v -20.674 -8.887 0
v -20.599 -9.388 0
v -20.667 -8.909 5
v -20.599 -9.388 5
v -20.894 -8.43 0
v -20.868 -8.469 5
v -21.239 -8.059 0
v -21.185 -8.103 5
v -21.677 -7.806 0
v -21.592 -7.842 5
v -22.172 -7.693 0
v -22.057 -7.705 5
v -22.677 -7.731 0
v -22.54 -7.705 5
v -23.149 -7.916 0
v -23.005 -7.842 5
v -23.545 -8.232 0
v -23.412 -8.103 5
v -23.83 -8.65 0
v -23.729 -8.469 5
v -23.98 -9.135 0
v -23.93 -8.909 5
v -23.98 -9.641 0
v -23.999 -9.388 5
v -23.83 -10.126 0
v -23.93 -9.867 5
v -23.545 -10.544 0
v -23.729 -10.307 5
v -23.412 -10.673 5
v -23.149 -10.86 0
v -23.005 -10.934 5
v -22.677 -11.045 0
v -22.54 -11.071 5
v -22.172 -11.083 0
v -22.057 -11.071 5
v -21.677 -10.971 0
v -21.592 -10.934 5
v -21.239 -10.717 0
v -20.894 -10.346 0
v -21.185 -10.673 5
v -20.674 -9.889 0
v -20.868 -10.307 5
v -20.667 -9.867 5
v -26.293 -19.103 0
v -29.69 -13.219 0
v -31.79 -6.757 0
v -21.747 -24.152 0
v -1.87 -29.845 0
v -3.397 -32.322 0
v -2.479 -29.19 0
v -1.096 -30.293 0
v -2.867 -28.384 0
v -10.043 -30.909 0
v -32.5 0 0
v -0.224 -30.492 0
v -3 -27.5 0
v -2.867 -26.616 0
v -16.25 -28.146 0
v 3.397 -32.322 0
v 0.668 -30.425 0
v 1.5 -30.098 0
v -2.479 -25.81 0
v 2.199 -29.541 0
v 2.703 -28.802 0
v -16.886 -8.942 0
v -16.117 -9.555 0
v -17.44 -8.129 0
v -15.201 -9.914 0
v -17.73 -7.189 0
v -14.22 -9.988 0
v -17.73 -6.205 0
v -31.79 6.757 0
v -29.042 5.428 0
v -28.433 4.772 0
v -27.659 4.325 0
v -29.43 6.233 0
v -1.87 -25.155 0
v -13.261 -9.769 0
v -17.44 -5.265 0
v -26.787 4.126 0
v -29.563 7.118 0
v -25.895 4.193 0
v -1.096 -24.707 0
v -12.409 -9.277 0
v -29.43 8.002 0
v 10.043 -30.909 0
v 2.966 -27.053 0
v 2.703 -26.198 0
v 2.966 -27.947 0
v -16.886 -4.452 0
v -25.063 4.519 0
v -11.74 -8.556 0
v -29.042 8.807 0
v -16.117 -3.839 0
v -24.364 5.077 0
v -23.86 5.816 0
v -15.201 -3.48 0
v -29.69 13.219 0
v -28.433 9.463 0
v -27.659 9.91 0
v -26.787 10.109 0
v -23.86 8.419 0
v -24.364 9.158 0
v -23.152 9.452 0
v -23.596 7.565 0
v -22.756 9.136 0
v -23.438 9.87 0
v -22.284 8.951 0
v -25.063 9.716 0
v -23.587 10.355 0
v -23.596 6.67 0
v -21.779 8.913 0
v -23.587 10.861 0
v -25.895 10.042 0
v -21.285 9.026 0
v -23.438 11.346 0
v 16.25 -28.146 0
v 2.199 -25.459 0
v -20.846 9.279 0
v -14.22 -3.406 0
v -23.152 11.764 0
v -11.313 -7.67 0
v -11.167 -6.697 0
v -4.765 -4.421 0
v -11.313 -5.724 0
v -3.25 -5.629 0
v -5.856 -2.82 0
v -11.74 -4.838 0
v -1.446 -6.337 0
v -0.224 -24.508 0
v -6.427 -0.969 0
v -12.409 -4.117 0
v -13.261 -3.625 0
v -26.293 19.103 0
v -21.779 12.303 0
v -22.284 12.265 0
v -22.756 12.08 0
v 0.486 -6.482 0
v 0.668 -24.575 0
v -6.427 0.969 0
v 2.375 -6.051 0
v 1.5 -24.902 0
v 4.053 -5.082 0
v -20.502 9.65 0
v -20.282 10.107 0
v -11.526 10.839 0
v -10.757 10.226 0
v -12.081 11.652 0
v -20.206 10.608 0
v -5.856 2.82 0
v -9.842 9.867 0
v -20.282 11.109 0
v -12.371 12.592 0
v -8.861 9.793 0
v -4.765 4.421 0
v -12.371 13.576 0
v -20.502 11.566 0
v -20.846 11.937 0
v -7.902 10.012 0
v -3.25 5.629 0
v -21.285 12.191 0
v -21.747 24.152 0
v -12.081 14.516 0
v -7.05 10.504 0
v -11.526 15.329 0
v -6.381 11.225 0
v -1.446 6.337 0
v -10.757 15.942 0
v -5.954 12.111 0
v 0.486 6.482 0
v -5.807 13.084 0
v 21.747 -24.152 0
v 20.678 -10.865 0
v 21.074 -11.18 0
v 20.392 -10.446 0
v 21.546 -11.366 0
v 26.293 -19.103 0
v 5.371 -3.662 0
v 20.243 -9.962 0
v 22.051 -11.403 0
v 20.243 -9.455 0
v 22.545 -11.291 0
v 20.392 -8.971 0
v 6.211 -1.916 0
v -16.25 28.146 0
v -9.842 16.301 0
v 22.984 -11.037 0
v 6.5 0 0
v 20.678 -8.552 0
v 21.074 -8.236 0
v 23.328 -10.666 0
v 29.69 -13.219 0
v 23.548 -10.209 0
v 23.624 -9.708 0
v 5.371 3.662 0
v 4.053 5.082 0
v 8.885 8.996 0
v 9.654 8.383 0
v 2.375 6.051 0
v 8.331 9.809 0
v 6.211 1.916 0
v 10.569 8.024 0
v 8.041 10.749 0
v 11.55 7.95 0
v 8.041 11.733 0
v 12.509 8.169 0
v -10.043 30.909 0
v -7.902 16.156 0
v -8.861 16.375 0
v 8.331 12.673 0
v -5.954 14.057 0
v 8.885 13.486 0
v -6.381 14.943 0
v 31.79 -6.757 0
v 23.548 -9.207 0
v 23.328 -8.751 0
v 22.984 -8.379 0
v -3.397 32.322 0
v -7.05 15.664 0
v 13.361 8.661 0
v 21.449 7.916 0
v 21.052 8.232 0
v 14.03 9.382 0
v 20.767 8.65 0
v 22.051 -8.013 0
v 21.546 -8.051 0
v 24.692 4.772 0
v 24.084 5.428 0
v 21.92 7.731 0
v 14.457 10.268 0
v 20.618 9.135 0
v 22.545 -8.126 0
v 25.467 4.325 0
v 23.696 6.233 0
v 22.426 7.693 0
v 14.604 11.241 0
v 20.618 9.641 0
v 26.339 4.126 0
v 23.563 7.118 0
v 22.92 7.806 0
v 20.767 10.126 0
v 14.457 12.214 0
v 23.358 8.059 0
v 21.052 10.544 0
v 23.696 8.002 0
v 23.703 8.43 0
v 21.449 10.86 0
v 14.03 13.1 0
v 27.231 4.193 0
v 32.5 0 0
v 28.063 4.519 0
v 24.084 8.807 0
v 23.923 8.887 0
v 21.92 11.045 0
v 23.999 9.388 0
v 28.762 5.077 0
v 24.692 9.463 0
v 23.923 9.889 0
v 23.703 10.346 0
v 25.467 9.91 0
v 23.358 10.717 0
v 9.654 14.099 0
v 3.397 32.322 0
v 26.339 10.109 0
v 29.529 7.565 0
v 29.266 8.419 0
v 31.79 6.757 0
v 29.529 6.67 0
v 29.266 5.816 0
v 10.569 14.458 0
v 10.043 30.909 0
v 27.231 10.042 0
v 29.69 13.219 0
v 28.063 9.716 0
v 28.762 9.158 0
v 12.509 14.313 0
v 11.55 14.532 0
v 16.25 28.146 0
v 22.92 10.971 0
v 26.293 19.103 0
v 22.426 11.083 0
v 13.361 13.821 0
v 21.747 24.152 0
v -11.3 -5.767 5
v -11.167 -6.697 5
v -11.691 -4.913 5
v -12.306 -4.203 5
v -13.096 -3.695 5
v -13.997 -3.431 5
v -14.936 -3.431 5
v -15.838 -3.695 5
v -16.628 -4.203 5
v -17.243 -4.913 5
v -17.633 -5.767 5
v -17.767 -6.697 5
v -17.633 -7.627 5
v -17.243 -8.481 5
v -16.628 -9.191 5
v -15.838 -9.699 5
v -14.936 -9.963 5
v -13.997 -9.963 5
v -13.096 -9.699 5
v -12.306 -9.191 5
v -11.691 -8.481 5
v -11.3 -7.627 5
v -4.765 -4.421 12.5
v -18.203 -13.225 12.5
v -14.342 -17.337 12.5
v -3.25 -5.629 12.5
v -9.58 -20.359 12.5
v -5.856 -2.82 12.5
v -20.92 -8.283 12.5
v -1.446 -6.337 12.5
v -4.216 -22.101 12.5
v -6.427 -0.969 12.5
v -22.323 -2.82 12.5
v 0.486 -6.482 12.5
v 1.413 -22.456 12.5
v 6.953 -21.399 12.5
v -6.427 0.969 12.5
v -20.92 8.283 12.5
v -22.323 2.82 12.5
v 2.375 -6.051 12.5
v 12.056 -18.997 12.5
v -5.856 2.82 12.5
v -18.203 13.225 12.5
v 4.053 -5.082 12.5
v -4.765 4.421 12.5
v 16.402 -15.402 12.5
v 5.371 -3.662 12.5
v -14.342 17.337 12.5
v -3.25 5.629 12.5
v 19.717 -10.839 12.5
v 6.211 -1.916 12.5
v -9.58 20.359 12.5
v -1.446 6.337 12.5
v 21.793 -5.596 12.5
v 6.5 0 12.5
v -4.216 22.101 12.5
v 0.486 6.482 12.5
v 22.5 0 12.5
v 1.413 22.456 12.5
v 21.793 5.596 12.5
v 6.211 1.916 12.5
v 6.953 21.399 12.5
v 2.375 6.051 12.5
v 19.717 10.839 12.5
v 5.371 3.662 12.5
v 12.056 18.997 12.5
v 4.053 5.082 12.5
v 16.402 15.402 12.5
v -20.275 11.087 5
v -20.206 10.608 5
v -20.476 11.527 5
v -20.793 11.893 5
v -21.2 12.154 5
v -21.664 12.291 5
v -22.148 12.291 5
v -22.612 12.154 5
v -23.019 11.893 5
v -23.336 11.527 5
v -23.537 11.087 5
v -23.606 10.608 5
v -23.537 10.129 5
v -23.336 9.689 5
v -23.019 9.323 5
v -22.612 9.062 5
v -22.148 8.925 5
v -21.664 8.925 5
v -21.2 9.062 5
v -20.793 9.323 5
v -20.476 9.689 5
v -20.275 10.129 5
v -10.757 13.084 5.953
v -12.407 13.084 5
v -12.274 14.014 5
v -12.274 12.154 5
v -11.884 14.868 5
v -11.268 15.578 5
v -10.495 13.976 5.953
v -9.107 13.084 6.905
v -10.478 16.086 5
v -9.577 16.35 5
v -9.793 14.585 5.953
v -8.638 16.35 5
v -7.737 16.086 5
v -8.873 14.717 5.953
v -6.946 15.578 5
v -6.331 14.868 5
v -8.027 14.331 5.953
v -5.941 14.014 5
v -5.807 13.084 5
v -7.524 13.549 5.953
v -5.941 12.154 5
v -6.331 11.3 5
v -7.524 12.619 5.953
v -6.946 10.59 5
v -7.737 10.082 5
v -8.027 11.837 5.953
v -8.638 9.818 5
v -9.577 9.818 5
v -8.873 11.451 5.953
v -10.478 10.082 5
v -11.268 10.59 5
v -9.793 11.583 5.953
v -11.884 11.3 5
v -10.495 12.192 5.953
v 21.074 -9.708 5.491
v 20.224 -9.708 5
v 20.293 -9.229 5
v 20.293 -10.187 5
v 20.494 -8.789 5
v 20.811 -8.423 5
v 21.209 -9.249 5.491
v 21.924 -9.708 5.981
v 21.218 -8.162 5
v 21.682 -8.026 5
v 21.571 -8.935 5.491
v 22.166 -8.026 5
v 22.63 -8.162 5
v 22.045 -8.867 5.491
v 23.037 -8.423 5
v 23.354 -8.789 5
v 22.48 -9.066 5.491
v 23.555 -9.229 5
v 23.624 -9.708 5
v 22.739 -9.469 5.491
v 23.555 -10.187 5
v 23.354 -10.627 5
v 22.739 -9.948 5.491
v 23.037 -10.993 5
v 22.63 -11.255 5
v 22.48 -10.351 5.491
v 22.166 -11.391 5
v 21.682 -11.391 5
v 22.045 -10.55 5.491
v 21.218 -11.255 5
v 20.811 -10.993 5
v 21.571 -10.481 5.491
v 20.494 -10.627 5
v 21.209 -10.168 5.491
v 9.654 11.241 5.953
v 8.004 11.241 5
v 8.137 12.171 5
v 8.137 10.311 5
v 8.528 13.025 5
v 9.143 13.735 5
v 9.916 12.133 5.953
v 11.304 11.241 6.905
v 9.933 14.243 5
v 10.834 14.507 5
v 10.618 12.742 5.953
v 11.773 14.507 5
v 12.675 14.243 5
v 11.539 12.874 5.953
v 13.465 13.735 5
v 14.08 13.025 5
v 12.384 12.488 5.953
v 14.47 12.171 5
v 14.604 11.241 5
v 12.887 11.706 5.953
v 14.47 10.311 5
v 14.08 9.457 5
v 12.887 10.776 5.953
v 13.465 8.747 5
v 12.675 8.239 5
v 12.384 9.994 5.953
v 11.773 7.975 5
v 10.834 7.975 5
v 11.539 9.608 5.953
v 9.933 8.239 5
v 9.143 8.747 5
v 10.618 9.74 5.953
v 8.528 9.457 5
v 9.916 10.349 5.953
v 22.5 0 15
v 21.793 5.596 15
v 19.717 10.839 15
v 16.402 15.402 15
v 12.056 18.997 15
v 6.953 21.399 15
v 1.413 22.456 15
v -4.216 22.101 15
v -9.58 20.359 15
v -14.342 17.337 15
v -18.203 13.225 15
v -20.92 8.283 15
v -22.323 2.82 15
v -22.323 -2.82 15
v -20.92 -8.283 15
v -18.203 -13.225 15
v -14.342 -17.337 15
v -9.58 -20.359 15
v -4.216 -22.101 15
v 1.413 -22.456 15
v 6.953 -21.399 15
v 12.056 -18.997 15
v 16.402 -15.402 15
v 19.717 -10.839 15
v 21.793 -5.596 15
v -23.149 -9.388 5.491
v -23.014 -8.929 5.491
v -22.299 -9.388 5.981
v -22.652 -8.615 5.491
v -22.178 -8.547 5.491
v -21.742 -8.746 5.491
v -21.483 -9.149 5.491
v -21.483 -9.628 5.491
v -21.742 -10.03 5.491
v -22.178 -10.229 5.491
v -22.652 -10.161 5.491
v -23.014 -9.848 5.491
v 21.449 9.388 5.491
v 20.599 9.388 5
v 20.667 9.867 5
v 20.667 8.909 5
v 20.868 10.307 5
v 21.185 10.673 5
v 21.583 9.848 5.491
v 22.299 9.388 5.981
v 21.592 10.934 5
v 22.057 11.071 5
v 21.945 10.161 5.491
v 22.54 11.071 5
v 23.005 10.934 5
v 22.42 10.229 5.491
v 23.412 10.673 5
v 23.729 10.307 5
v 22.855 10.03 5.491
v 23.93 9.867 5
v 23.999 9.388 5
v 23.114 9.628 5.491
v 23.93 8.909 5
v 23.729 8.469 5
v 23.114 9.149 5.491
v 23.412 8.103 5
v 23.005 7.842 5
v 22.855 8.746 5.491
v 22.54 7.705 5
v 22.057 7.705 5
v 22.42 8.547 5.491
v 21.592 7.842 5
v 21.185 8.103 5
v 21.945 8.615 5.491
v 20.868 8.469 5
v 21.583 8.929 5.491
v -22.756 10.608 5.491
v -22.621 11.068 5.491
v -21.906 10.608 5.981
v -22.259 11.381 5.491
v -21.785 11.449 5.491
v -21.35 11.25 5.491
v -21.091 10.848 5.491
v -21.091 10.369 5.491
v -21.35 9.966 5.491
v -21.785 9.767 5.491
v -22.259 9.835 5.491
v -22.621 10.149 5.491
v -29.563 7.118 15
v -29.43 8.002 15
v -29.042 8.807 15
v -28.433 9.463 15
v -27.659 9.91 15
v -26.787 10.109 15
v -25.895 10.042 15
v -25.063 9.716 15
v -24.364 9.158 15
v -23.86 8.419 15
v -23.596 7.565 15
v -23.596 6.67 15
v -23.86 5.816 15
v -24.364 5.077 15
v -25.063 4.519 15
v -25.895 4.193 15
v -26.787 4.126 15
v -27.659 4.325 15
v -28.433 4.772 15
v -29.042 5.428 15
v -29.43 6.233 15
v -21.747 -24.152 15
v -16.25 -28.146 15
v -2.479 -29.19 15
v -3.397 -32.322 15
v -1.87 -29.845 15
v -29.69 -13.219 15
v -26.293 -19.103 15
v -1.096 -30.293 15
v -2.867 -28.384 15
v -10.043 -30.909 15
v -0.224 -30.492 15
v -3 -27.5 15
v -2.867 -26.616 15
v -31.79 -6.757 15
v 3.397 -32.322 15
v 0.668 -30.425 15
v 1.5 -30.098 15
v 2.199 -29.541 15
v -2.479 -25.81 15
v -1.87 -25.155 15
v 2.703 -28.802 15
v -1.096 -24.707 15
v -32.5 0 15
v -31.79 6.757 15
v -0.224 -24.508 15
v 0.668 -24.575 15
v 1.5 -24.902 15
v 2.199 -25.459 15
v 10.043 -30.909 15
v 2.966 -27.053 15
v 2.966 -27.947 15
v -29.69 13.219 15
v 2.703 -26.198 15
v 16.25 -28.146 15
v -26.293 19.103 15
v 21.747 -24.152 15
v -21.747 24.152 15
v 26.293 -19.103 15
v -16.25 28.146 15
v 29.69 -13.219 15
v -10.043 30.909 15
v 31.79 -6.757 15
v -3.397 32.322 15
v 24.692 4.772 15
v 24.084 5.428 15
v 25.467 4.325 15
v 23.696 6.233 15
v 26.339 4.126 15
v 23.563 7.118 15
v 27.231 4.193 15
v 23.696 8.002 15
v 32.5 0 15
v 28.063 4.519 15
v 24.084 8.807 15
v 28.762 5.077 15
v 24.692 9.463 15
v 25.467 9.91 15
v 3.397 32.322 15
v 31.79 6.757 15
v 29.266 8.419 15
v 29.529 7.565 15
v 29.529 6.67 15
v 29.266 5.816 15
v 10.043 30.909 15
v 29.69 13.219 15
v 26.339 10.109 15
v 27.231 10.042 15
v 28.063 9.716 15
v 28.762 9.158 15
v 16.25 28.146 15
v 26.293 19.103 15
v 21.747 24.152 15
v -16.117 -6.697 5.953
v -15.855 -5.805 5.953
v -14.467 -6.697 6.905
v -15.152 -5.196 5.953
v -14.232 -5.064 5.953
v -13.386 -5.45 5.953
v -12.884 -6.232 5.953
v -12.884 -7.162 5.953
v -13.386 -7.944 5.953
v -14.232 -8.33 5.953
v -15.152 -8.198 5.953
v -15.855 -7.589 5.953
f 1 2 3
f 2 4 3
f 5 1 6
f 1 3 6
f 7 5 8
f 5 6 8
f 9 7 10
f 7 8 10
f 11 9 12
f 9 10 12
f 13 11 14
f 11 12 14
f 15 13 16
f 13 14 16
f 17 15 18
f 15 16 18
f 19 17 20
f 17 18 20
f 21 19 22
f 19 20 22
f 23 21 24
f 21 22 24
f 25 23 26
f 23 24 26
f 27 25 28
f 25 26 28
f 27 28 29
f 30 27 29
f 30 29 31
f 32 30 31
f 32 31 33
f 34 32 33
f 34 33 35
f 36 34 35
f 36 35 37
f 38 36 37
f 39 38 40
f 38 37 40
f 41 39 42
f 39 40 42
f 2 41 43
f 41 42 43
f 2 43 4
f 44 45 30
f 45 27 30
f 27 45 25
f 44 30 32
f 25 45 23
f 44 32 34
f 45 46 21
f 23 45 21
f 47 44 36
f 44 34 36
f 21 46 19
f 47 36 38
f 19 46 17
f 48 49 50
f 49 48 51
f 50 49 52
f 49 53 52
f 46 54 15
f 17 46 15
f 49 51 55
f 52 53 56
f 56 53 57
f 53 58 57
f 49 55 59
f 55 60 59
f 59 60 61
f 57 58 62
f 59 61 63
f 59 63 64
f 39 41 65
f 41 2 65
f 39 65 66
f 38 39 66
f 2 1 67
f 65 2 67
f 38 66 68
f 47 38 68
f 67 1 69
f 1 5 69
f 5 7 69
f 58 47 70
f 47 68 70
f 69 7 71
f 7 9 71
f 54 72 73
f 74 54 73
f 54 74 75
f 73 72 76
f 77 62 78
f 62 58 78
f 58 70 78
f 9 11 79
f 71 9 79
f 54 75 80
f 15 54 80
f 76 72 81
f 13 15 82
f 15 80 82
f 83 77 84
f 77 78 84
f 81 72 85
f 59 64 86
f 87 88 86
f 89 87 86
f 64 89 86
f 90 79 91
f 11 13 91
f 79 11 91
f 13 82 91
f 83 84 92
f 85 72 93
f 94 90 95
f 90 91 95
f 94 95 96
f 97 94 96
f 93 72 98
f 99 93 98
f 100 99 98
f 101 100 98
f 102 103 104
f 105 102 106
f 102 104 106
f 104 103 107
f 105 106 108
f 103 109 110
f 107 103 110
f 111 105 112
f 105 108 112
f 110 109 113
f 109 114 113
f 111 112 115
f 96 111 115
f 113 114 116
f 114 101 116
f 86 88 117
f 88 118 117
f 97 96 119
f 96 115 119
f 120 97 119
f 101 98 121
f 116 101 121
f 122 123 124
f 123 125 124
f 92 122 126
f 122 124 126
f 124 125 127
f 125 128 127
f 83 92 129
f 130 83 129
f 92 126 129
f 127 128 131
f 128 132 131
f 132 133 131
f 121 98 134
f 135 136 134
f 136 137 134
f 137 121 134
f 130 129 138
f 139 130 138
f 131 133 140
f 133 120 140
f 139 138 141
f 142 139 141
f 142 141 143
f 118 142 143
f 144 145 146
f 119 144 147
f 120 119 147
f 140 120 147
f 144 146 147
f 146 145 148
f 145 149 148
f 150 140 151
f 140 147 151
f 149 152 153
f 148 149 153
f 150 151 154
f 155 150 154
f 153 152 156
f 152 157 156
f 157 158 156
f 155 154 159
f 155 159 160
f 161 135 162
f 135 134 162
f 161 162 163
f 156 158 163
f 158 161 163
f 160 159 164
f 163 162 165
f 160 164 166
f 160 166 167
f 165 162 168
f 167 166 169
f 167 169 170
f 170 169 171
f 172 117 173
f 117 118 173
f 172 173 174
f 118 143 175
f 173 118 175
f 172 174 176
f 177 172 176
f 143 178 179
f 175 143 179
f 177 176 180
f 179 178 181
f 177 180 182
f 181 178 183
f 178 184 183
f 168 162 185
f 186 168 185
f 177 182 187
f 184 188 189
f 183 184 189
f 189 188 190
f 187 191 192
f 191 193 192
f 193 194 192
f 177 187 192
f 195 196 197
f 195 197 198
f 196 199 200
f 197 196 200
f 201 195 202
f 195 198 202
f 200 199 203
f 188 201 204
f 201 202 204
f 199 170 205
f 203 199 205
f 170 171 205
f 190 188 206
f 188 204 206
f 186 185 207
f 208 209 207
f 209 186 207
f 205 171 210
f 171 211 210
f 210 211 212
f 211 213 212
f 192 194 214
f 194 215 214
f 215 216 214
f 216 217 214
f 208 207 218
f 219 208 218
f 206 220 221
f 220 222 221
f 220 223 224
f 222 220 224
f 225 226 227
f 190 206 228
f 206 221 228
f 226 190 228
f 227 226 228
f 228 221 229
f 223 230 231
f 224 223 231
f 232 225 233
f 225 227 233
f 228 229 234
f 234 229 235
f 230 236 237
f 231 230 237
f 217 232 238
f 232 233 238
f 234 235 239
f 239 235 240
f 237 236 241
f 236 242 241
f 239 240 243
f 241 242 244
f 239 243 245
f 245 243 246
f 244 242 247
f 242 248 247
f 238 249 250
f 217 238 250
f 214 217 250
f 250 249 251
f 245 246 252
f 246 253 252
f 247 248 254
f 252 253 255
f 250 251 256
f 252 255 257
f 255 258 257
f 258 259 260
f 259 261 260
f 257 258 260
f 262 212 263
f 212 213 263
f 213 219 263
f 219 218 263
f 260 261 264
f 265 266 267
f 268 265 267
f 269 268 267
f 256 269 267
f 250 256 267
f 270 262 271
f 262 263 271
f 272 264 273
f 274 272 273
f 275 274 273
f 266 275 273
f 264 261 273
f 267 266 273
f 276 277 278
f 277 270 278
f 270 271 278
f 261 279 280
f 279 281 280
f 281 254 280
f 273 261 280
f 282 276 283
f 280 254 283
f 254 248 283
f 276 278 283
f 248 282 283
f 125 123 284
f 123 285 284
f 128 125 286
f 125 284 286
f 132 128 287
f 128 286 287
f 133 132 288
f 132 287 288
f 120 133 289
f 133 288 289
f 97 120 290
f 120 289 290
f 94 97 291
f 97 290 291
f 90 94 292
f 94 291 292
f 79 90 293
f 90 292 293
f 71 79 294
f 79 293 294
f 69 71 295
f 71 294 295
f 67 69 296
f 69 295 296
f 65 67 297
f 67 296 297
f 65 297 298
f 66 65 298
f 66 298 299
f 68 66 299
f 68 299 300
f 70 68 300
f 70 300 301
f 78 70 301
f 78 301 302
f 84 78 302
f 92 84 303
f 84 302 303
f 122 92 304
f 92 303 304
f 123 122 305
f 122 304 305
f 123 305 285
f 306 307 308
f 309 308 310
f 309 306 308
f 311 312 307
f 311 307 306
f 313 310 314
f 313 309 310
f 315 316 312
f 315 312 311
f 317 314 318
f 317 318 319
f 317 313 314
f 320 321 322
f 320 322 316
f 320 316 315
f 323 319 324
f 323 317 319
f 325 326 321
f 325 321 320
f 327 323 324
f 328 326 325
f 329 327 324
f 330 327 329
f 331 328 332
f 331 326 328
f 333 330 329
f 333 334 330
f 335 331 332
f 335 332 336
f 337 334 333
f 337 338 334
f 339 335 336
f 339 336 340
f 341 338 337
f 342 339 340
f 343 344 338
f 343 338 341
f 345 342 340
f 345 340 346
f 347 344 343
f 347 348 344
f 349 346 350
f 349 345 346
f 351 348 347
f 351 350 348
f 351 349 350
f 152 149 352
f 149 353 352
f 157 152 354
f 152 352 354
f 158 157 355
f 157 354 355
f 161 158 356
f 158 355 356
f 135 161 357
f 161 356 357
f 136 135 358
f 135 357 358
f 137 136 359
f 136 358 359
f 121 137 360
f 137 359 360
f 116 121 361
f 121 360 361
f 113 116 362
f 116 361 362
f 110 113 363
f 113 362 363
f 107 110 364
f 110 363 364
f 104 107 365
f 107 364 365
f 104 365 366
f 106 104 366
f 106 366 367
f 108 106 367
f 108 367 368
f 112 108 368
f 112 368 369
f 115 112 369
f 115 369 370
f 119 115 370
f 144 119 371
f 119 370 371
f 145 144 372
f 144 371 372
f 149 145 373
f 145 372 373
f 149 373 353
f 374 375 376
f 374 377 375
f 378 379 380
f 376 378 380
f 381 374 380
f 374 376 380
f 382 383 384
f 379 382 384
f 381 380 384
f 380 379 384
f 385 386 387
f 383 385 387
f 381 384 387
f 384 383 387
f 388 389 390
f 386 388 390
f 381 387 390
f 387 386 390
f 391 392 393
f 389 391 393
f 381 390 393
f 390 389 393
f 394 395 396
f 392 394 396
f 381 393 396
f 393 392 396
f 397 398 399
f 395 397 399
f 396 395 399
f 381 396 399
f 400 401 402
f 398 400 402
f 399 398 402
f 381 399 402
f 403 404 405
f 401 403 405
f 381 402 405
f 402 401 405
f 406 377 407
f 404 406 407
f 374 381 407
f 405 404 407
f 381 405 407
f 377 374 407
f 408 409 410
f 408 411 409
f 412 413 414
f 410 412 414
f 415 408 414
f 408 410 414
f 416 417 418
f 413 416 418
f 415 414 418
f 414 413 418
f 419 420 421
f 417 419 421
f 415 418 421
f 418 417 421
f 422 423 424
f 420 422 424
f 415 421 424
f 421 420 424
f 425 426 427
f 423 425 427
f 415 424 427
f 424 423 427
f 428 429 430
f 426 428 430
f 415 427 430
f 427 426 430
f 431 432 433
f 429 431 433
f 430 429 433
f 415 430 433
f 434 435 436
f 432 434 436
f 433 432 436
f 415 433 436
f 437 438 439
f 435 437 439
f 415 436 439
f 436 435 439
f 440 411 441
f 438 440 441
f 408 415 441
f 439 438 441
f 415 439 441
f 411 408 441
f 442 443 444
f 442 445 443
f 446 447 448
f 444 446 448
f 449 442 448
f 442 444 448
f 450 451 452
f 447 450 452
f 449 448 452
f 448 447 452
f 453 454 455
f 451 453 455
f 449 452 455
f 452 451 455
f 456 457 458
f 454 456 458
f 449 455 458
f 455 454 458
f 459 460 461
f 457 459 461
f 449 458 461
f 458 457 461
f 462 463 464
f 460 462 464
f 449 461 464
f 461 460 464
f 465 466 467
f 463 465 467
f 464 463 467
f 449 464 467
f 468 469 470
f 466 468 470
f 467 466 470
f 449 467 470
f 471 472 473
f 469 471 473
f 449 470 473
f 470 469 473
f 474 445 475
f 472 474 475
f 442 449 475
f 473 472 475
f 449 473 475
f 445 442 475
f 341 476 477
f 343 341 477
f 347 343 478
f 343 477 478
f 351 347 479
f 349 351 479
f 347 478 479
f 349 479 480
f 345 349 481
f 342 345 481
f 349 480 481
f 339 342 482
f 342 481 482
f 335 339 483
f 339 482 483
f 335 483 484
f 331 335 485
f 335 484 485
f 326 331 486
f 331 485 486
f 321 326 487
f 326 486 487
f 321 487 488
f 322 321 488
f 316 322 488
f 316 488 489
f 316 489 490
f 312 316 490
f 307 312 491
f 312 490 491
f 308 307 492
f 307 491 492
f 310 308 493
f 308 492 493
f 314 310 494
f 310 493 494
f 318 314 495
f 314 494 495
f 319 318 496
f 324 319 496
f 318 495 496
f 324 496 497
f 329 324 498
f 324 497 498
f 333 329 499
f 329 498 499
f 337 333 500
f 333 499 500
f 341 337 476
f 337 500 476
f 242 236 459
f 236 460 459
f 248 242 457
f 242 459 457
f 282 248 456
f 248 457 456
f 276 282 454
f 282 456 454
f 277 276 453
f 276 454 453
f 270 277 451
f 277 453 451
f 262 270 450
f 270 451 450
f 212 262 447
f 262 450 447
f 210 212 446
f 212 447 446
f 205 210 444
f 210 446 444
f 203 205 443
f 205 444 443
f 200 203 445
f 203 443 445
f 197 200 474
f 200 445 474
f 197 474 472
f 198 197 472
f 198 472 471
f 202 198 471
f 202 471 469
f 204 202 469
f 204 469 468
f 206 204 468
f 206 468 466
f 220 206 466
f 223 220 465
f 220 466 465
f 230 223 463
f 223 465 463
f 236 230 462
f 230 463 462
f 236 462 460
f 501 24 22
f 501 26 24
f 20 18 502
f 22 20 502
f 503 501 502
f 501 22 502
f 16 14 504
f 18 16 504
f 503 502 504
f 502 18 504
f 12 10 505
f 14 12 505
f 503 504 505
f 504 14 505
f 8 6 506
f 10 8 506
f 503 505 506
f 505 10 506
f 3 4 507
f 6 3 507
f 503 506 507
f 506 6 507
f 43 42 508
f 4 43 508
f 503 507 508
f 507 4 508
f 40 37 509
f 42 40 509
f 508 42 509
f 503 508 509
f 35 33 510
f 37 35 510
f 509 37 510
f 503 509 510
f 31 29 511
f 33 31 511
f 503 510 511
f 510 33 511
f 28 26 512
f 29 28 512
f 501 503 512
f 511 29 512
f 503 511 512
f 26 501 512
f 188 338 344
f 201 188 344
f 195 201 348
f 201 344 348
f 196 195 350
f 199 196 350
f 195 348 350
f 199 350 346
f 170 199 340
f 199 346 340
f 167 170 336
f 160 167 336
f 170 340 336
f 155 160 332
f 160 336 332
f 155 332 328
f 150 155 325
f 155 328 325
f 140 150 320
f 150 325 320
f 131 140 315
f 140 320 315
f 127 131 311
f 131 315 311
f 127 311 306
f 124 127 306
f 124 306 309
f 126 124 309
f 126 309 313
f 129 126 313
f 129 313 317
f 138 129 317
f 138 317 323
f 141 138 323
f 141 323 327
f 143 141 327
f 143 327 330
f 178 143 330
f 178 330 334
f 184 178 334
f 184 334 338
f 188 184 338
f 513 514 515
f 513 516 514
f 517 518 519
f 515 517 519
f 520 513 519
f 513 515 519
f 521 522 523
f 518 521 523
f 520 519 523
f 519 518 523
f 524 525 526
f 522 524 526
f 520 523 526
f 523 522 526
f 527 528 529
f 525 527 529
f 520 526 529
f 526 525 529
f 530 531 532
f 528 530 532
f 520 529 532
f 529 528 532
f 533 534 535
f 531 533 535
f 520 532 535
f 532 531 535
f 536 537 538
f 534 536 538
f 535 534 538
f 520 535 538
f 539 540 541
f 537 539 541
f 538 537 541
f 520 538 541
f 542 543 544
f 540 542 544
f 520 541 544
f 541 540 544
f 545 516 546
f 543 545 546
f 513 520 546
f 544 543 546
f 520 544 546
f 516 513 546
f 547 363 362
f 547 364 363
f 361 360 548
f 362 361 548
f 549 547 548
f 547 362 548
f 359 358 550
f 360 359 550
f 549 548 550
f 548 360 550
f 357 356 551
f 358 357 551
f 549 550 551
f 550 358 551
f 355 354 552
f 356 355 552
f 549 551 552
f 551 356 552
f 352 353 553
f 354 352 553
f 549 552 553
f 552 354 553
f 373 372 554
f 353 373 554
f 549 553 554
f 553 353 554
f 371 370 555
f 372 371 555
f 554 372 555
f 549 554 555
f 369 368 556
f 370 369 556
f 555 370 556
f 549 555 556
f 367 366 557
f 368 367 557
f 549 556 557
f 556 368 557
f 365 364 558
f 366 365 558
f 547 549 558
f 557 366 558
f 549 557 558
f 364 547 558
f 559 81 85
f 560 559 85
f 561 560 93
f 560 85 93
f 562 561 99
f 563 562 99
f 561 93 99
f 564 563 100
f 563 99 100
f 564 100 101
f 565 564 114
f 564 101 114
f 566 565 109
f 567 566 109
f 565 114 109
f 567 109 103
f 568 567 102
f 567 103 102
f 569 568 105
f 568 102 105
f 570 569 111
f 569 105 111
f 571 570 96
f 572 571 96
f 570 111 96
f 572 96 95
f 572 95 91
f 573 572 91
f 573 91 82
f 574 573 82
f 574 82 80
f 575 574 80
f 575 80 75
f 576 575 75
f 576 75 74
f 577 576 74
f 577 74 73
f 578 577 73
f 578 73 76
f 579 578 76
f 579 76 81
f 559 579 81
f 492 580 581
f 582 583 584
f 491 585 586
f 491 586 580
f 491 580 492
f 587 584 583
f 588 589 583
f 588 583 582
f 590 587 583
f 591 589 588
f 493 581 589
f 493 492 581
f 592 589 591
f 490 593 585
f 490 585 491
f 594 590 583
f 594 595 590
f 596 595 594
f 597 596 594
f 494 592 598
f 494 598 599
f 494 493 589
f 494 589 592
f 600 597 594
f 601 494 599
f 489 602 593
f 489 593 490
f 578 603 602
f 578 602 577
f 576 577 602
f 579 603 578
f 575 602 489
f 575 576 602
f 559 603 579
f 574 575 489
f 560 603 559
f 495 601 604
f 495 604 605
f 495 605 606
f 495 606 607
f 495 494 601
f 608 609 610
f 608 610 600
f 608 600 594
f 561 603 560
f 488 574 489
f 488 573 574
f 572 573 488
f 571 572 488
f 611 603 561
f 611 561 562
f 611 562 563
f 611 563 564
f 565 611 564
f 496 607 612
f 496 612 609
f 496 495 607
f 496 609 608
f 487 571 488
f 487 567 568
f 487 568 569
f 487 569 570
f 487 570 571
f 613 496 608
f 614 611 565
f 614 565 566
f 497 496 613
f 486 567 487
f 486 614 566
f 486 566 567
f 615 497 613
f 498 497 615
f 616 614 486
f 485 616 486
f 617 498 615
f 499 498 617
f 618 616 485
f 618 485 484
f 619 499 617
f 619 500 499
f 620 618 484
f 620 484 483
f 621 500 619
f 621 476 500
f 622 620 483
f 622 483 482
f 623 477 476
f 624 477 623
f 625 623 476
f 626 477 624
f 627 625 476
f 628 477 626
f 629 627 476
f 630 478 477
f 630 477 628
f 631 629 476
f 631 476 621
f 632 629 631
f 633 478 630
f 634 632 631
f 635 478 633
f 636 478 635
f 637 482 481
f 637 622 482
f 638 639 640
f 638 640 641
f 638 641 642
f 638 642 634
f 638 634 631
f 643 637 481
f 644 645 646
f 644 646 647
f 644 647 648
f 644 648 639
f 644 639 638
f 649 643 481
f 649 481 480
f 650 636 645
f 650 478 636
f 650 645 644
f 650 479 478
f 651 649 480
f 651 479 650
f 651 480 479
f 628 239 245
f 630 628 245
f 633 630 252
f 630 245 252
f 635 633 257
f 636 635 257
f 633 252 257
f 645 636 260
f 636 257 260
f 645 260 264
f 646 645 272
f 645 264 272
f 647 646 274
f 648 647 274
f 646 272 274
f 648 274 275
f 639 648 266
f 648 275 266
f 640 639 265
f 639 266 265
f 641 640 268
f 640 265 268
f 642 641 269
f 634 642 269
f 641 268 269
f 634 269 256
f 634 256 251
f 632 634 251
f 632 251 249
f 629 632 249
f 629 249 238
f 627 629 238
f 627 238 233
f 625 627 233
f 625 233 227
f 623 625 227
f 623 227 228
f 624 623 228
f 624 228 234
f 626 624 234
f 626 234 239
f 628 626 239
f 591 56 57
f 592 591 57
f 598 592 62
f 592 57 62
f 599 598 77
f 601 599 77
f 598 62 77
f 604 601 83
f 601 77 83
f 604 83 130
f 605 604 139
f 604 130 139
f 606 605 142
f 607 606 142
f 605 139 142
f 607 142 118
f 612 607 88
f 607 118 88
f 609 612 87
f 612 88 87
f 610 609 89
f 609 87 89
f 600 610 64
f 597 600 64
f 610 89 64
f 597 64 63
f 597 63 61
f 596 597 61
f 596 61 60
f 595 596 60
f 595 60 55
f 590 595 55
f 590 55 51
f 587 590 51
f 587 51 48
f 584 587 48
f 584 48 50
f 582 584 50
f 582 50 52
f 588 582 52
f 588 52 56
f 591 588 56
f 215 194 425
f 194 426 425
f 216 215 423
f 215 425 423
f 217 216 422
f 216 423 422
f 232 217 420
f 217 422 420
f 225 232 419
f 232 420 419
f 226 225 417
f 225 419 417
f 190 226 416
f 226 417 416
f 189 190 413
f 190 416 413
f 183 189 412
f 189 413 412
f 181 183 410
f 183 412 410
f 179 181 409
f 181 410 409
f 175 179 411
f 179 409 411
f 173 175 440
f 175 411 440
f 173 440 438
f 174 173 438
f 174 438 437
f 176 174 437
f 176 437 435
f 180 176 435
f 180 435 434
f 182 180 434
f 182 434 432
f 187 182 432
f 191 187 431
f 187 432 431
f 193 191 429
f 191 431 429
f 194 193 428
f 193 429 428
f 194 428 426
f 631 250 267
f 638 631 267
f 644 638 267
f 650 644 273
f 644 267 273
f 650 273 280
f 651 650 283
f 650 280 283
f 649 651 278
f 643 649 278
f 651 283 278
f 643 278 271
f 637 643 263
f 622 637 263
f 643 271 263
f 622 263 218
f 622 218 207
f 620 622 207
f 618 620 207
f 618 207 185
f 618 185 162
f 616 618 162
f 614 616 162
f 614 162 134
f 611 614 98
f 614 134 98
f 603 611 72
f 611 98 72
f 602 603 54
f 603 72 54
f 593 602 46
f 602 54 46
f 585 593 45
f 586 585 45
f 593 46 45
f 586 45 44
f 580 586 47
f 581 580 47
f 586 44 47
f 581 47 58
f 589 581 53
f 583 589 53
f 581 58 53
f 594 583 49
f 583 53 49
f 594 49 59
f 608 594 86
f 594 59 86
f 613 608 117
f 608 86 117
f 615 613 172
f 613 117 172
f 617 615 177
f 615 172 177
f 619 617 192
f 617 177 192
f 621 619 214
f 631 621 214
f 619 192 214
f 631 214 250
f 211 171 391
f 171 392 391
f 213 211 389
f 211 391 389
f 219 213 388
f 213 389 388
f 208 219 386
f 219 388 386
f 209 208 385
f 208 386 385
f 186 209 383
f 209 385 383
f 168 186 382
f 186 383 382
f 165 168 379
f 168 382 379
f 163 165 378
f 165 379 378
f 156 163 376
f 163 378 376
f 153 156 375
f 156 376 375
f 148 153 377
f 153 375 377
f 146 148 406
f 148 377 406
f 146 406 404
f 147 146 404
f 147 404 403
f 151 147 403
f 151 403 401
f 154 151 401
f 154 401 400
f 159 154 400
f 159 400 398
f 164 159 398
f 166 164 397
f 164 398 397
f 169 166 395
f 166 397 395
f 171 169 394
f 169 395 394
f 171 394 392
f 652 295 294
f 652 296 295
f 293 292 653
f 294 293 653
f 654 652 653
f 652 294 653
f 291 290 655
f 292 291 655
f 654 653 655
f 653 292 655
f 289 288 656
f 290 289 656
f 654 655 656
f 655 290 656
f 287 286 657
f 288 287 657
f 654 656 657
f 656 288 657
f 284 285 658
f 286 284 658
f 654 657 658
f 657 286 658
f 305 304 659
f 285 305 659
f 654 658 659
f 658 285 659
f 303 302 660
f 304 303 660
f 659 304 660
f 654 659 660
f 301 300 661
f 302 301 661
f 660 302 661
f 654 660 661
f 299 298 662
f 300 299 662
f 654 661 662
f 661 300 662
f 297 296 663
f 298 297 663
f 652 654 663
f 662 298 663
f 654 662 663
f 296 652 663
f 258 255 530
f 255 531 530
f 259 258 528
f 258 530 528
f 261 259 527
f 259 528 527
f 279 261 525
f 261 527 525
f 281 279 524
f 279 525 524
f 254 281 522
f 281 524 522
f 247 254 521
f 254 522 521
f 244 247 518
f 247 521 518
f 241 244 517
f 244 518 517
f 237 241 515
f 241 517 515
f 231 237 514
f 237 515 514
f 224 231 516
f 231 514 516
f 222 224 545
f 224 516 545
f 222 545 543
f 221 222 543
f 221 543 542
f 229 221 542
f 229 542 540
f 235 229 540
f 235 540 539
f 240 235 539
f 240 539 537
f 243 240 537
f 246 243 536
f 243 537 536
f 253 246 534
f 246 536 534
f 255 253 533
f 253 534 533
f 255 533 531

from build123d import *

# Parameters (mm, degrees)
ESQUISSE1_R                = 32.5
BOSS_EXTRU_1_DEPTH         = 15
ESQUISSE2_R                = 22.5
ENL_V_MAT_EXTRU_1_DEPTH    = 2.5
ESQUISSE3_R                = 6.5
ENL_V_MAT_EXTRU_2_DEPTH    = 48.631397208
TROUS_DE_CENTRAGE_6_0MM1_D = 6
D_GAGEMENT_M61_D           = 6.6
D_GAGEMENT_M61_DEPTH       = 5
D_GAGEMENT_M61_TIP         = 1.905255888
D_GAGEMENT_M31_D           = 3.4
D_GAGEMENT_M31_DEPTH       = 5
D_GAGEMENT_M31_TIP         = 0.981495458
D_GAGEMENT_M32_D           = 3.4
D_GAGEMENT_M32_DEPTH       = 5
D_GAGEMENT_M32_TIP         = 0.981495458


with BuildPart() as part:
    # Esquisse1 → Boss.-Extru.1 (new body)
    with BuildSketch(Plane.XY):
        Circle(ESQUISSE1_R)
    extrude(amount=BOSS_EXTRU_1_DEPTH)

    # Esquisse2 → Enlèv. mat.-Extru.1 (cut)
    with BuildSketch(Plane.XY.offset(15)):
        Circle(ESQUISSE2_R)
    extrude(amount=-ENL_V_MAT_EXTRU_1_DEPTH, mode=Mode.SUBTRACT)

    # Esquisse3 → Enlèv. mat.-Extru.2 (cut, through all)
    with BuildSketch(Plane.XY.offset(12.5)):
        Circle(ESQUISSE3_R)
    extrude(amount=-ENL_V_MAT_EXTRU_2_DEPTH, mode=Mode.SUBTRACT)

    # Trous de centrage Ø6.0mm1 (through all)
    with Locations(Plane.XY.offset(15)):
        with Locations((0, -27.5), (-26.562960223, 7.11752374), (26.562960223, 7.11752374)):
            Hole(TROUS_DE_CENTRAGE_6_0MM1_D / 2)

    # Dégagement M61
    with Locations(Plane(origin=(0, 0, 0), x_dir=(-1, 0, 0), z_dir=(0, 0, -1))):
        with Locations((-11.303753991, 11.241031035), (9.107378233, 13.084009123), (14.466713258, -6.697002353)):
            Hole(D_GAGEMENT_M61_D / 2, depth=D_GAGEMENT_M61_DEPTH)
            with Locations((0, 0, -(D_GAGEMENT_M61_DEPTH + D_GAGEMENT_M61_TIP / 2))):  # 120° drill point
                Cone(0, D_GAGEMENT_M61_D / 2, D_GAGEMENT_M61_TIP, mode=Mode.SUBTRACT)

    # Dégagement M31
    with Locations(Plane(origin=(0, 0, 0), x_dir=(-1, 0, 0), z_dir=(0, 0, -1))):
        with Locations((22.298556593, -9.388080653), (21.906177888, 10.608069951)):
            Hole(D_GAGEMENT_M31_D / 2, depth=D_GAGEMENT_M31_DEPTH)
            with Locations((0, 0, -(D_GAGEMENT_M31_DEPTH + D_GAGEMENT_M31_TIP / 2))):  # 120° drill point
                Cone(0, D_GAGEMENT_M31_D / 2, D_GAGEMENT_M31_TIP, mode=Mode.SUBTRACT)

    # Dégagement M32
    with Locations(Plane(origin=(0, 0, 0), x_dir=(-1, 0, 0), z_dir=(0, 0, -1))):
        with Locations((-21.92383493, -9.708243173), (-22.298556593, 9.388080653)):
            Hole(D_GAGEMENT_M32_D / 2, depth=D_GAGEMENT_M32_DEPTH)
            with Locations((0, 0, -(D_GAGEMENT_M32_DEPTH + D_GAGEMENT_M32_TIP / 2))):  # 120° drill point
                Cone(0, D_GAGEMENT_M32_D / 2, D_GAGEMENT_M32_TIP, mode=Mode.SUBTRACT)


solid = part.part
